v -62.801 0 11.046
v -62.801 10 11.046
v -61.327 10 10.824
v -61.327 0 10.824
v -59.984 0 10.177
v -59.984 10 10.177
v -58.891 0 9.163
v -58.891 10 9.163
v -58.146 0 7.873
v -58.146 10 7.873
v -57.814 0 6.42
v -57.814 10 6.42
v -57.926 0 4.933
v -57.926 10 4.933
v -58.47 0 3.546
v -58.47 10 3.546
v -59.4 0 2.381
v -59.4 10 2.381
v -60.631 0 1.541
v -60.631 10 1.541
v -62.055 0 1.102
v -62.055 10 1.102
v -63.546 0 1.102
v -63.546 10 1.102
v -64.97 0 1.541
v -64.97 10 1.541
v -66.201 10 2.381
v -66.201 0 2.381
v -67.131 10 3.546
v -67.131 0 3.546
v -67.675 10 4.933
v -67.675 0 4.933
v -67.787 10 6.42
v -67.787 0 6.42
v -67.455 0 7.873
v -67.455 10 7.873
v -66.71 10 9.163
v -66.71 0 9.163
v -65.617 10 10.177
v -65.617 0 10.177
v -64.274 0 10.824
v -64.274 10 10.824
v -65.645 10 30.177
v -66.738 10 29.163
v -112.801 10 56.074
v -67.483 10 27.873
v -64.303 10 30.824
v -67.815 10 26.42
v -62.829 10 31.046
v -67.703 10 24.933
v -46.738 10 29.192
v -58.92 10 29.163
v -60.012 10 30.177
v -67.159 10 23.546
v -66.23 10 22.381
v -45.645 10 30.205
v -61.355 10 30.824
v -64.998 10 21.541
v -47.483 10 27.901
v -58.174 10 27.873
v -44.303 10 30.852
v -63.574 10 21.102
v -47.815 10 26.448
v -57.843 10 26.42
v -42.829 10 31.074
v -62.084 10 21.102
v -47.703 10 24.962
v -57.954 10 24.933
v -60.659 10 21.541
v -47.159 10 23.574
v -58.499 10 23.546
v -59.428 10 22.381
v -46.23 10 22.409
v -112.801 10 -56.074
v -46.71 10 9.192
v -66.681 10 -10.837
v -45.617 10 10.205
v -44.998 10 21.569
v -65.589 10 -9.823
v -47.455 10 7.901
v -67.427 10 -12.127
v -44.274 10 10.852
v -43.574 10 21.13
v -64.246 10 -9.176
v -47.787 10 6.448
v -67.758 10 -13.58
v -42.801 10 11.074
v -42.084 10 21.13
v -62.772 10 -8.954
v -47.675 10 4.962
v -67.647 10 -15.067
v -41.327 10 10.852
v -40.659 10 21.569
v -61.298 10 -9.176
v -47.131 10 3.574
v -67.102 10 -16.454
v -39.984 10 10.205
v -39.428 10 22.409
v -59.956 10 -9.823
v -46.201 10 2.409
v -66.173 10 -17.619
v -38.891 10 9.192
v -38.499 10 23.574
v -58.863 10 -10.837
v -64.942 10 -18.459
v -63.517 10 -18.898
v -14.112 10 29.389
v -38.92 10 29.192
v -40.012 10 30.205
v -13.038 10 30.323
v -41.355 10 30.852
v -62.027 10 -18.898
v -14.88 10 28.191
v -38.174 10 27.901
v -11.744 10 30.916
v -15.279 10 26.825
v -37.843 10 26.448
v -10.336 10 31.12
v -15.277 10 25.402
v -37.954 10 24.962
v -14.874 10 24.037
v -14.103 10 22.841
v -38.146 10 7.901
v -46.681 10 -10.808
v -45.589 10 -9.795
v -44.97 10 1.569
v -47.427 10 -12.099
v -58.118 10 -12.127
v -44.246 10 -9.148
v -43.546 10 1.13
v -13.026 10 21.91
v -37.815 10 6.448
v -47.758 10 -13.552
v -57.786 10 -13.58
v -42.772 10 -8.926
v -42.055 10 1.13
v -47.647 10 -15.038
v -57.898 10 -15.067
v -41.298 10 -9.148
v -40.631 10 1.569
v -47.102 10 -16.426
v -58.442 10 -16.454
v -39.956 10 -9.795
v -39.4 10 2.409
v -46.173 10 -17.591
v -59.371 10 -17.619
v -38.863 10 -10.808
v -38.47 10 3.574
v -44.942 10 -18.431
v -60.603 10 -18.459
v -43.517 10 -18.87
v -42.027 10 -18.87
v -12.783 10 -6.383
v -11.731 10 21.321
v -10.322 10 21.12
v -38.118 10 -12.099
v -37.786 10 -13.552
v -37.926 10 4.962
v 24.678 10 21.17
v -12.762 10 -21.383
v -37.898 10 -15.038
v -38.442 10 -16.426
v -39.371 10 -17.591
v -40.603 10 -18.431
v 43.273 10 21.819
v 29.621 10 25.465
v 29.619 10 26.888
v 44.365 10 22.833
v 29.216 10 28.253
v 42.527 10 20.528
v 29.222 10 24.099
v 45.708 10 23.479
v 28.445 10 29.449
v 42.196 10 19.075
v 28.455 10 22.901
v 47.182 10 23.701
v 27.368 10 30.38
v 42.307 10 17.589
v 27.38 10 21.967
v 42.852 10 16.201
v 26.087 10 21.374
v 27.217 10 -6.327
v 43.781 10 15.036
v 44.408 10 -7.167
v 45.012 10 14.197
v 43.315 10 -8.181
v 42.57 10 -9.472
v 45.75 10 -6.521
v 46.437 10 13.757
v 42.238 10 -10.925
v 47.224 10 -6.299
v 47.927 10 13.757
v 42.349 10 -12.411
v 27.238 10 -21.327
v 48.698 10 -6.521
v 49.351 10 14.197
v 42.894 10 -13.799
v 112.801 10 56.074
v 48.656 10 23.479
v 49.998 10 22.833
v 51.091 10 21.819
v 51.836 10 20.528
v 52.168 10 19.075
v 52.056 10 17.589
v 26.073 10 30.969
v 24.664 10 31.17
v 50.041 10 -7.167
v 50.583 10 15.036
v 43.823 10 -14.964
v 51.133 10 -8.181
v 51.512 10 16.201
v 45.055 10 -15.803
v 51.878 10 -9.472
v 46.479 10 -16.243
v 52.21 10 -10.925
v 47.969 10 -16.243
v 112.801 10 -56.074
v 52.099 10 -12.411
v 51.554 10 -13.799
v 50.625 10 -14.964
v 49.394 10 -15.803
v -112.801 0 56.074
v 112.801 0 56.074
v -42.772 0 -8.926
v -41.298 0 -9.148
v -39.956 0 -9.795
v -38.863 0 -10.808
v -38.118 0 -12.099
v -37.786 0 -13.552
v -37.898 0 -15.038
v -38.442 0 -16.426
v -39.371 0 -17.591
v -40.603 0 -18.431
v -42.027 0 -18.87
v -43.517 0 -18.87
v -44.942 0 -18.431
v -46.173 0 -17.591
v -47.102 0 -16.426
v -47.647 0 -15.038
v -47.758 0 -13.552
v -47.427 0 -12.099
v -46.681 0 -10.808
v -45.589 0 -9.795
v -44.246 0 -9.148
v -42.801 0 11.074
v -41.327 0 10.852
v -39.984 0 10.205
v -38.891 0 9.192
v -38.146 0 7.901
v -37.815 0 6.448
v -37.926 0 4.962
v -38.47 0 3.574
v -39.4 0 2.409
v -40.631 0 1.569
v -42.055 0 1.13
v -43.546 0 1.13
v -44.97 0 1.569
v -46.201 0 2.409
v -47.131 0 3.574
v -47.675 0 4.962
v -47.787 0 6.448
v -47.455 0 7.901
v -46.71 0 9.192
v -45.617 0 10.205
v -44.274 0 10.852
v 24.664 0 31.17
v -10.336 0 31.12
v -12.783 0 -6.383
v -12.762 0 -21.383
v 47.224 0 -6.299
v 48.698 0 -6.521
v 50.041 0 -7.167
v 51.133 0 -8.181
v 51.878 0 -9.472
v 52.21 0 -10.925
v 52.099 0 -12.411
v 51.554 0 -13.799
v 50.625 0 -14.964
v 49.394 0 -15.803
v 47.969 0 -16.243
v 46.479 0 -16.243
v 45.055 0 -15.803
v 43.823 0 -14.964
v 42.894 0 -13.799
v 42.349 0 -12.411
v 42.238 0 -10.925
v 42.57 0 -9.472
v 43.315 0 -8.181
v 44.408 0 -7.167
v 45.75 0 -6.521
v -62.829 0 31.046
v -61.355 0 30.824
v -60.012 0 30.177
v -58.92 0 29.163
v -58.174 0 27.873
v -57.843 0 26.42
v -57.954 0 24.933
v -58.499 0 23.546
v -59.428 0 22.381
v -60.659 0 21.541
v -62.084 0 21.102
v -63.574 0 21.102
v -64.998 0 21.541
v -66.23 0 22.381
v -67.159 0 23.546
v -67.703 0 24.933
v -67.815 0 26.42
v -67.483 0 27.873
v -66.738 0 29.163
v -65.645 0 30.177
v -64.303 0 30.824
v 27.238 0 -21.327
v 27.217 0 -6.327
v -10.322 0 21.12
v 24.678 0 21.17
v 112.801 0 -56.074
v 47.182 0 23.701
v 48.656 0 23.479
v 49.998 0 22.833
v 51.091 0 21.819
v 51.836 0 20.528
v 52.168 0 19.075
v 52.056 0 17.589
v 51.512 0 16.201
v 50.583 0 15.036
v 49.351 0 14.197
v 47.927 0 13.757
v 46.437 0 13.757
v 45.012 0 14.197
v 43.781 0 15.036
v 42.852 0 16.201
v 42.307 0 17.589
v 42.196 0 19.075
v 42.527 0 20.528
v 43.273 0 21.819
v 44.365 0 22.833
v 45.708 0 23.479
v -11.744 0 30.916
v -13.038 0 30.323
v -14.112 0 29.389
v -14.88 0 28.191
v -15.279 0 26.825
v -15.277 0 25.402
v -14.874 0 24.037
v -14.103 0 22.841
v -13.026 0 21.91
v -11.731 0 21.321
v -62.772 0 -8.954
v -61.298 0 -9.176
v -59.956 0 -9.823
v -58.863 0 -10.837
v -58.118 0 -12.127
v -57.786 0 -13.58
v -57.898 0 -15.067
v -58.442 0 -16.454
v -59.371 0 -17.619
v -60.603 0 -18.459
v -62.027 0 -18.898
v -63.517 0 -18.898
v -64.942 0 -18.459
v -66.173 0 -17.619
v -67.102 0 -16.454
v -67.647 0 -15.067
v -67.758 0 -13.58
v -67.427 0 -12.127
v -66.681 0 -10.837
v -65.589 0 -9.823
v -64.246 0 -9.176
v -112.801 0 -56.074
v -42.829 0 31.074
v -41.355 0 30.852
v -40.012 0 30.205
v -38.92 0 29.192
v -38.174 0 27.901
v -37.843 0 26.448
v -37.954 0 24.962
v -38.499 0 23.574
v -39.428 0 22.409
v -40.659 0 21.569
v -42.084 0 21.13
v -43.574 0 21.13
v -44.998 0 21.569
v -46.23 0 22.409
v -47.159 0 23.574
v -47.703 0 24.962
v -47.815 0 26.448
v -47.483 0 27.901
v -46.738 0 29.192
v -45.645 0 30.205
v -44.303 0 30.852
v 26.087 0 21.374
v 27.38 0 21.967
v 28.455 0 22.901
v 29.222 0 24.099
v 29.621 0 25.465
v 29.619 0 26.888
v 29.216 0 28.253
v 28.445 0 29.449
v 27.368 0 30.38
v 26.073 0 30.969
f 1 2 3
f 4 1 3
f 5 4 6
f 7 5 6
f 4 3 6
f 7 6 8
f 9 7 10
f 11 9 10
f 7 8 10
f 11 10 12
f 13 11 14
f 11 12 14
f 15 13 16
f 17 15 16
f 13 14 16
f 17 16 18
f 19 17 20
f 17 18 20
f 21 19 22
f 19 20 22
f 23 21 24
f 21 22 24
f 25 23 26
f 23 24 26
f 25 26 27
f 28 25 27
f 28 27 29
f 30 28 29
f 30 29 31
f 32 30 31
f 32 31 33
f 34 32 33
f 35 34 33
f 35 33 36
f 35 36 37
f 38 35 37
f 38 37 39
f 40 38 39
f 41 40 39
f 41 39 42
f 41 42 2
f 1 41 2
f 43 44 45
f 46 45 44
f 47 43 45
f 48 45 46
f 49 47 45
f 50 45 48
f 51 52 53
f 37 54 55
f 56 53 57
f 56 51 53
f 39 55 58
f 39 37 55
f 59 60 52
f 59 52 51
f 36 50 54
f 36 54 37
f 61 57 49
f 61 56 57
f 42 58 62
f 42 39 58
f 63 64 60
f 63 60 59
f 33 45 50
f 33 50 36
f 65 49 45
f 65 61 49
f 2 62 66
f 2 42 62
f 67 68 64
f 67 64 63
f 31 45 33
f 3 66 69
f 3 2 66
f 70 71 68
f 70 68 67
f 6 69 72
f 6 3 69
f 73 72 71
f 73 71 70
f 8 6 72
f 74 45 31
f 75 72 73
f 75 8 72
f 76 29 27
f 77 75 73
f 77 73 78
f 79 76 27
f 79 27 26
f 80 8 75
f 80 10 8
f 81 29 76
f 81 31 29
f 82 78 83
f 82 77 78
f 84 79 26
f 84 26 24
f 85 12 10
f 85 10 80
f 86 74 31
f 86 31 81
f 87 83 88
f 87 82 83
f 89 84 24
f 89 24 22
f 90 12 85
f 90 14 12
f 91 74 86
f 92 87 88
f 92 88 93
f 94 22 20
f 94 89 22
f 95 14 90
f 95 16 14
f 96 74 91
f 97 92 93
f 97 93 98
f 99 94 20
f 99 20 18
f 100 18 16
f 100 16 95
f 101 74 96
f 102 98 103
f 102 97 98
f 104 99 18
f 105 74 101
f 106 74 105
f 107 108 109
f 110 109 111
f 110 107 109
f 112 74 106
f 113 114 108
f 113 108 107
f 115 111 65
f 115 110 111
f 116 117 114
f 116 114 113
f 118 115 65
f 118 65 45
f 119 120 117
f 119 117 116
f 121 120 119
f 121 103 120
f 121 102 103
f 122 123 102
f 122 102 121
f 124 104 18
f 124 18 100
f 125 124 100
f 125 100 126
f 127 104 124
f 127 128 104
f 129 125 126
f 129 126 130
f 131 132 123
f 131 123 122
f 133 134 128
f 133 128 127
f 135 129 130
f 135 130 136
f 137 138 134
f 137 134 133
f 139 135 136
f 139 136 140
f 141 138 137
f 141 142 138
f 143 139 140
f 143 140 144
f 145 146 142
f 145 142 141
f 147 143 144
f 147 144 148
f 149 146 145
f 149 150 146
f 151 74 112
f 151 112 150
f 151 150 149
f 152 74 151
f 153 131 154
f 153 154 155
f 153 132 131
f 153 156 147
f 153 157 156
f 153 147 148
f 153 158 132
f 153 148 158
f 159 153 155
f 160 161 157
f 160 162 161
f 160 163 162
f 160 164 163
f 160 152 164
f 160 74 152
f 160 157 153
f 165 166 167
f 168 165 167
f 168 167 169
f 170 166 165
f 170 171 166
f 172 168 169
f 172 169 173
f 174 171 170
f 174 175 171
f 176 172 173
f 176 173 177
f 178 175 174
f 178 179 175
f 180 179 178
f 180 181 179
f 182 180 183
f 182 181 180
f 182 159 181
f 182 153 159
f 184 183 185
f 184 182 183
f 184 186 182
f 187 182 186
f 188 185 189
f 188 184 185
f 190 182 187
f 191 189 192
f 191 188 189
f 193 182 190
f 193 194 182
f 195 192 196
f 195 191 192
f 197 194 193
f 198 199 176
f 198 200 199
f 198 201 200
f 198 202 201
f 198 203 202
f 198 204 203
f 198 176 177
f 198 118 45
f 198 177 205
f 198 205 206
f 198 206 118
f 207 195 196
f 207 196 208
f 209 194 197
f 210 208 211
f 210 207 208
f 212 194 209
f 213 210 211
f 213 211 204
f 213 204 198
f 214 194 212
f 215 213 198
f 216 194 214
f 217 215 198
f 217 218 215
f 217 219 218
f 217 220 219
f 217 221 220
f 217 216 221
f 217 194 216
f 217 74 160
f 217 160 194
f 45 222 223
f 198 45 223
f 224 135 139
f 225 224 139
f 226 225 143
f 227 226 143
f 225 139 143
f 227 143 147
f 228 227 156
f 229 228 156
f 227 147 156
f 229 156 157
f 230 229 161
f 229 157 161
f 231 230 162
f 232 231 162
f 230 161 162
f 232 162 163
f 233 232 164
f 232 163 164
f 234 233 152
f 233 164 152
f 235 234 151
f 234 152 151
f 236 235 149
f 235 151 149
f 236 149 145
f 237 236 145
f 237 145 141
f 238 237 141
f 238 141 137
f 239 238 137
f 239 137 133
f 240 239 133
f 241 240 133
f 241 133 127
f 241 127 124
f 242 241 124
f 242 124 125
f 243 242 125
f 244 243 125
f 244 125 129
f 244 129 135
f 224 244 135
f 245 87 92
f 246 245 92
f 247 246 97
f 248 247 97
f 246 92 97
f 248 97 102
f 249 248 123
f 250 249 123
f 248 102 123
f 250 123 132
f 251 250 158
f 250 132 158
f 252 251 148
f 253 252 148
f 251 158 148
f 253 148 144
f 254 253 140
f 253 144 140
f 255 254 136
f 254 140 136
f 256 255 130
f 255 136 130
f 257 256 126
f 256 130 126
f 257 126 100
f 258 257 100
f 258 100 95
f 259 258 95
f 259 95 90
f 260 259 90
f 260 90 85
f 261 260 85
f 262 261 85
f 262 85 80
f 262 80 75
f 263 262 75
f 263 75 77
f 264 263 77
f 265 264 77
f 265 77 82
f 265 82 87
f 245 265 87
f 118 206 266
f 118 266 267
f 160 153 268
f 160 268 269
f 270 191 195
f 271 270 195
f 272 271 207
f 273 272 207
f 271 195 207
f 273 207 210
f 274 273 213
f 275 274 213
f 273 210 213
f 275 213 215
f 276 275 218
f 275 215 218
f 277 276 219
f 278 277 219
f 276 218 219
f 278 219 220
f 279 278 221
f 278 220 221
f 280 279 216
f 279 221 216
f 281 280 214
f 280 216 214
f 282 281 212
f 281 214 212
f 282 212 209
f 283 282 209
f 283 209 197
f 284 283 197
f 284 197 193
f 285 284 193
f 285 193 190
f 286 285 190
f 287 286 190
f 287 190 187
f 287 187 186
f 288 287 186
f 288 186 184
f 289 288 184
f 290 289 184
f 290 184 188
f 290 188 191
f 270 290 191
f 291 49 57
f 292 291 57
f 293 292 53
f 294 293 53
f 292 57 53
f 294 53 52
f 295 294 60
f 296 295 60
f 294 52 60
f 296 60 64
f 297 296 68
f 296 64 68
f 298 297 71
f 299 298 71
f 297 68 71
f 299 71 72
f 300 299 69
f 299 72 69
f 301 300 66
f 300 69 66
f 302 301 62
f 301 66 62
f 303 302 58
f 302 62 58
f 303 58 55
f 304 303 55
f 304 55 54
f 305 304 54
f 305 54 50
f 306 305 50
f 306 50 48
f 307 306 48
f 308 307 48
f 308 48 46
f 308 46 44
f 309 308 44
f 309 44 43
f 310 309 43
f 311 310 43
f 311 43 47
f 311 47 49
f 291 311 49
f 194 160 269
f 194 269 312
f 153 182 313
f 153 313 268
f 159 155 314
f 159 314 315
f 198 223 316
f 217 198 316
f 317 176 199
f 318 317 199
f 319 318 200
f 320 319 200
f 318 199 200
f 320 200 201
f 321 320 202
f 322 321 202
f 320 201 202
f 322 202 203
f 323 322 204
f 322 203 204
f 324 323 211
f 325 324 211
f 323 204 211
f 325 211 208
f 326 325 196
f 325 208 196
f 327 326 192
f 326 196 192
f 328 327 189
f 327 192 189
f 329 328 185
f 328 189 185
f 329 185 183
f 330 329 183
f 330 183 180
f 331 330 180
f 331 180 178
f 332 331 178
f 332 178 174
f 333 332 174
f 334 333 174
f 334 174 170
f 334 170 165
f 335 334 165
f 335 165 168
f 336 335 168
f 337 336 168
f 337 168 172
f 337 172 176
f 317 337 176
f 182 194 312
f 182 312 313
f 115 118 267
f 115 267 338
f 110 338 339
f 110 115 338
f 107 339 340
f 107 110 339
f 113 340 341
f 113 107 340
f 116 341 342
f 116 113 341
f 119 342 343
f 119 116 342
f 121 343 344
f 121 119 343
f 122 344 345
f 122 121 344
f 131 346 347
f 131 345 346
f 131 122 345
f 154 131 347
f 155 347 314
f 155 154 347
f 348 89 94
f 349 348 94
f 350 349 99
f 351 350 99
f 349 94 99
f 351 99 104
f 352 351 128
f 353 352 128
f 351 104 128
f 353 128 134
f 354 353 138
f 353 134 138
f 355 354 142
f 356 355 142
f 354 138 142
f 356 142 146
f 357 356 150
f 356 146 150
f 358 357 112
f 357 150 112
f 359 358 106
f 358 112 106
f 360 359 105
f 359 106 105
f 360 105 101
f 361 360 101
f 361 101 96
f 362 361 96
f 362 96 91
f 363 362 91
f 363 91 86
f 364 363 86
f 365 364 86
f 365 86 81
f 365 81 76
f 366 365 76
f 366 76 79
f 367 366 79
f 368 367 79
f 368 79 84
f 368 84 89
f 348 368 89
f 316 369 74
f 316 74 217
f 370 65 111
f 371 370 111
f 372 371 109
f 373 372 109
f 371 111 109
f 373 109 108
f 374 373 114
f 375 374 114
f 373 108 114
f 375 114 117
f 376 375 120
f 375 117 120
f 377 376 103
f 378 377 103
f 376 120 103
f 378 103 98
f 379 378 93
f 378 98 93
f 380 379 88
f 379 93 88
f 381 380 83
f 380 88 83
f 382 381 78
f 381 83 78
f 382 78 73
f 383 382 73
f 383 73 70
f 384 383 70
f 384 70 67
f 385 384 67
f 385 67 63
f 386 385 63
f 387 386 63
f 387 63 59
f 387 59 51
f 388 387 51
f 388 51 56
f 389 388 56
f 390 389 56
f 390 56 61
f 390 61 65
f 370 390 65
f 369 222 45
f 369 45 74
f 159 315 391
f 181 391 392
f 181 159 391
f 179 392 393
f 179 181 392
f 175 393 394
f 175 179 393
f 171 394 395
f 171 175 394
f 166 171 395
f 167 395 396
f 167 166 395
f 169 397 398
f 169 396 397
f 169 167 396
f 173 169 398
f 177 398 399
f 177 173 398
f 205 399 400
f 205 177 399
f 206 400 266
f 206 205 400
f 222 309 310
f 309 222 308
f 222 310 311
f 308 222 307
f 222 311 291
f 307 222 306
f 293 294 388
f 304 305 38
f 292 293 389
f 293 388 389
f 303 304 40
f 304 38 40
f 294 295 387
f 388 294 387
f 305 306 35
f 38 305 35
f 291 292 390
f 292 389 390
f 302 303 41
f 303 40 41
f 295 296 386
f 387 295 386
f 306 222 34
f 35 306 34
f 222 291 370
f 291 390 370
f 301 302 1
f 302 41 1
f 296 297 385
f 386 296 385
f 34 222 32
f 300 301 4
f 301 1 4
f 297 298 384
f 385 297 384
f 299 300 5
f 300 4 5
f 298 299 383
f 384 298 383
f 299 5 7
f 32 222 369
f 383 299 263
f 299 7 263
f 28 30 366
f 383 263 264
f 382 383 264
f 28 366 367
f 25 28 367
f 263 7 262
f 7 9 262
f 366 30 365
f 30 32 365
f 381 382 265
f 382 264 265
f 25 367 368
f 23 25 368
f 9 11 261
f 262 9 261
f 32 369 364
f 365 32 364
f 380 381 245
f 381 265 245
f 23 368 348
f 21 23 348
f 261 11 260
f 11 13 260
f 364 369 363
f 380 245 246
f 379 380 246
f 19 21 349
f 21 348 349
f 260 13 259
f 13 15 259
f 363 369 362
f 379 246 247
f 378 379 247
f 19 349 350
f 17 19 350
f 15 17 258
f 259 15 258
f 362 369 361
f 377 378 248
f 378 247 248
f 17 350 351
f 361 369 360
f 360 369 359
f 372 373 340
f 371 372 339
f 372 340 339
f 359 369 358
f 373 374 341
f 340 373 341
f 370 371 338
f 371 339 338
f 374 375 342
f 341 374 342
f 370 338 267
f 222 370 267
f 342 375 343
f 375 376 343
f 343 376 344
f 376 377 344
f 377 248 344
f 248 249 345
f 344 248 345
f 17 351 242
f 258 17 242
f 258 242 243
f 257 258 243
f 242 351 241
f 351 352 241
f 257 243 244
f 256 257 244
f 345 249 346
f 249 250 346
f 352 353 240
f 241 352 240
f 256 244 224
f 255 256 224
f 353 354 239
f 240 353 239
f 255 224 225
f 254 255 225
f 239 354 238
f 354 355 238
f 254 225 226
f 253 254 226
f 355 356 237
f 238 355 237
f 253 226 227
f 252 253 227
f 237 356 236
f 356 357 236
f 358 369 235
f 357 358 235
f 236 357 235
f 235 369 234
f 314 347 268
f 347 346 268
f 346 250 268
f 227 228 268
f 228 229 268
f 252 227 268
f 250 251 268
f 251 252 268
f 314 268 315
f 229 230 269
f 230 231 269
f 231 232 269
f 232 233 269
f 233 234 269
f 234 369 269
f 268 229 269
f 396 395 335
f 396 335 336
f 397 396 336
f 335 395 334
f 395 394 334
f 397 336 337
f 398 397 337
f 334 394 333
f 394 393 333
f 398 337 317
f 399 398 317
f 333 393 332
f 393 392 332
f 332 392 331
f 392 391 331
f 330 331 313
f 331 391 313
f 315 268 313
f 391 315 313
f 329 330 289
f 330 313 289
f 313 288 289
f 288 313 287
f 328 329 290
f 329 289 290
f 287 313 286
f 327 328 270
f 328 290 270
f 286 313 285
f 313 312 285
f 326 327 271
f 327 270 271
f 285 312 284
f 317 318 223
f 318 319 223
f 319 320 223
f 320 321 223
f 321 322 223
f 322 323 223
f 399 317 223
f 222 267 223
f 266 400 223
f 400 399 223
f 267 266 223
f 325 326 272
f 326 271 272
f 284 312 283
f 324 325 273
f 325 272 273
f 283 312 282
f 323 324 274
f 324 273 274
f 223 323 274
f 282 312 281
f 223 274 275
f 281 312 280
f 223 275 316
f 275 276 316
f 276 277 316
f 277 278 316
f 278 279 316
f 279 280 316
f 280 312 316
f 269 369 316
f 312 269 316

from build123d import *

# Parameters (mm, degrees)
SKETCH2_W           = 225.601042676
SKETCH2_H           = 112.148495204
BOSS_EXTRUDE1_DEPTH = 10
SKETCH3_R           = 5
CUT_EXTRUDE1_DEPTH  = 127.365655375


with BuildPart() as part:
    # Sketch2 → Boss-Extrude1 (new body)
    with BuildSketch(Plane(origin=(0, 0, 0), x_dir=(1, 0, 0), z_dir=(0, 1, 0))):
        Rectangle(SKETCH2_W, SKETCH2_H)
    extrude(amount=BOSS_EXTRUDE1_DEPTH)

    # Sketch3 → Cut-Extrude1 (cut, through all)
    with BuildSketch(Plane(origin=(0, 10, 0), x_dir=(1, 0, 0), z_dir=(0, 1, 0))):
        with Locations(Location((47.181724175, -18.701420381, 0), (0, 0, 270))):
            Circle(SKETCH3_R)
        with Locations(Location((47.224119262, 11.298549663, 0), (0, 0, 270))):
            Circle(SKETCH3_R)
        with Locations(Location((-42.772257947, 13.925732428, 0), (0, 0, 270))):
            Circle(SKETCH3_R)
        with Locations(Location((-62.772237976, 13.953995819, 0), (0, 0, 270))):
            Circle(SKETCH3_R)
        with Locations(Location((-62.800501368, -6.04598421, 0), (0, 0, 270))):
            Circle(SKETCH3_R)
        with Locations(Location((-62.828764759, -26.04596424, 0), (0, 0, 270))):
            Circle(SKETCH3_R)
        with Locations(Location((-42.800521338, -6.074247602, 0), (0, 0, 270))):
            Circle(SKETCH3_R)
        with Locations(Location((-42.82878473, -26.074227631, 0), (0, 0, 270))):
            Circle(SKETCH3_R)
        Polygon((-12.761689131, 21.383329852), (27.238270928, 21.326803069), (27.217073385, 6.326818047), (-12.782886674, 6.38334483), align=None)
        with BuildLine():
            Line((24.664082022, -31.169611585), (-10.33588303, -31.12015065))
            ThreePointArc((-10.33588303, -31.12015065), (-15.328812189, -26.113089794), (-10.321751334, -21.120160635))
            Line((-10.321751334, -21.120160635), (24.678213718, -21.16962157))
            ThreePointArc((24.678213718, -21.16962157), (29.671142877, -26.176682425), (24.664082022, -31.169611585))
        make_face()
    extrude(amount=-CUT_EXTRUDE1_DEPTH, mode=Mode.SUBTRACT)


solid = part.part
